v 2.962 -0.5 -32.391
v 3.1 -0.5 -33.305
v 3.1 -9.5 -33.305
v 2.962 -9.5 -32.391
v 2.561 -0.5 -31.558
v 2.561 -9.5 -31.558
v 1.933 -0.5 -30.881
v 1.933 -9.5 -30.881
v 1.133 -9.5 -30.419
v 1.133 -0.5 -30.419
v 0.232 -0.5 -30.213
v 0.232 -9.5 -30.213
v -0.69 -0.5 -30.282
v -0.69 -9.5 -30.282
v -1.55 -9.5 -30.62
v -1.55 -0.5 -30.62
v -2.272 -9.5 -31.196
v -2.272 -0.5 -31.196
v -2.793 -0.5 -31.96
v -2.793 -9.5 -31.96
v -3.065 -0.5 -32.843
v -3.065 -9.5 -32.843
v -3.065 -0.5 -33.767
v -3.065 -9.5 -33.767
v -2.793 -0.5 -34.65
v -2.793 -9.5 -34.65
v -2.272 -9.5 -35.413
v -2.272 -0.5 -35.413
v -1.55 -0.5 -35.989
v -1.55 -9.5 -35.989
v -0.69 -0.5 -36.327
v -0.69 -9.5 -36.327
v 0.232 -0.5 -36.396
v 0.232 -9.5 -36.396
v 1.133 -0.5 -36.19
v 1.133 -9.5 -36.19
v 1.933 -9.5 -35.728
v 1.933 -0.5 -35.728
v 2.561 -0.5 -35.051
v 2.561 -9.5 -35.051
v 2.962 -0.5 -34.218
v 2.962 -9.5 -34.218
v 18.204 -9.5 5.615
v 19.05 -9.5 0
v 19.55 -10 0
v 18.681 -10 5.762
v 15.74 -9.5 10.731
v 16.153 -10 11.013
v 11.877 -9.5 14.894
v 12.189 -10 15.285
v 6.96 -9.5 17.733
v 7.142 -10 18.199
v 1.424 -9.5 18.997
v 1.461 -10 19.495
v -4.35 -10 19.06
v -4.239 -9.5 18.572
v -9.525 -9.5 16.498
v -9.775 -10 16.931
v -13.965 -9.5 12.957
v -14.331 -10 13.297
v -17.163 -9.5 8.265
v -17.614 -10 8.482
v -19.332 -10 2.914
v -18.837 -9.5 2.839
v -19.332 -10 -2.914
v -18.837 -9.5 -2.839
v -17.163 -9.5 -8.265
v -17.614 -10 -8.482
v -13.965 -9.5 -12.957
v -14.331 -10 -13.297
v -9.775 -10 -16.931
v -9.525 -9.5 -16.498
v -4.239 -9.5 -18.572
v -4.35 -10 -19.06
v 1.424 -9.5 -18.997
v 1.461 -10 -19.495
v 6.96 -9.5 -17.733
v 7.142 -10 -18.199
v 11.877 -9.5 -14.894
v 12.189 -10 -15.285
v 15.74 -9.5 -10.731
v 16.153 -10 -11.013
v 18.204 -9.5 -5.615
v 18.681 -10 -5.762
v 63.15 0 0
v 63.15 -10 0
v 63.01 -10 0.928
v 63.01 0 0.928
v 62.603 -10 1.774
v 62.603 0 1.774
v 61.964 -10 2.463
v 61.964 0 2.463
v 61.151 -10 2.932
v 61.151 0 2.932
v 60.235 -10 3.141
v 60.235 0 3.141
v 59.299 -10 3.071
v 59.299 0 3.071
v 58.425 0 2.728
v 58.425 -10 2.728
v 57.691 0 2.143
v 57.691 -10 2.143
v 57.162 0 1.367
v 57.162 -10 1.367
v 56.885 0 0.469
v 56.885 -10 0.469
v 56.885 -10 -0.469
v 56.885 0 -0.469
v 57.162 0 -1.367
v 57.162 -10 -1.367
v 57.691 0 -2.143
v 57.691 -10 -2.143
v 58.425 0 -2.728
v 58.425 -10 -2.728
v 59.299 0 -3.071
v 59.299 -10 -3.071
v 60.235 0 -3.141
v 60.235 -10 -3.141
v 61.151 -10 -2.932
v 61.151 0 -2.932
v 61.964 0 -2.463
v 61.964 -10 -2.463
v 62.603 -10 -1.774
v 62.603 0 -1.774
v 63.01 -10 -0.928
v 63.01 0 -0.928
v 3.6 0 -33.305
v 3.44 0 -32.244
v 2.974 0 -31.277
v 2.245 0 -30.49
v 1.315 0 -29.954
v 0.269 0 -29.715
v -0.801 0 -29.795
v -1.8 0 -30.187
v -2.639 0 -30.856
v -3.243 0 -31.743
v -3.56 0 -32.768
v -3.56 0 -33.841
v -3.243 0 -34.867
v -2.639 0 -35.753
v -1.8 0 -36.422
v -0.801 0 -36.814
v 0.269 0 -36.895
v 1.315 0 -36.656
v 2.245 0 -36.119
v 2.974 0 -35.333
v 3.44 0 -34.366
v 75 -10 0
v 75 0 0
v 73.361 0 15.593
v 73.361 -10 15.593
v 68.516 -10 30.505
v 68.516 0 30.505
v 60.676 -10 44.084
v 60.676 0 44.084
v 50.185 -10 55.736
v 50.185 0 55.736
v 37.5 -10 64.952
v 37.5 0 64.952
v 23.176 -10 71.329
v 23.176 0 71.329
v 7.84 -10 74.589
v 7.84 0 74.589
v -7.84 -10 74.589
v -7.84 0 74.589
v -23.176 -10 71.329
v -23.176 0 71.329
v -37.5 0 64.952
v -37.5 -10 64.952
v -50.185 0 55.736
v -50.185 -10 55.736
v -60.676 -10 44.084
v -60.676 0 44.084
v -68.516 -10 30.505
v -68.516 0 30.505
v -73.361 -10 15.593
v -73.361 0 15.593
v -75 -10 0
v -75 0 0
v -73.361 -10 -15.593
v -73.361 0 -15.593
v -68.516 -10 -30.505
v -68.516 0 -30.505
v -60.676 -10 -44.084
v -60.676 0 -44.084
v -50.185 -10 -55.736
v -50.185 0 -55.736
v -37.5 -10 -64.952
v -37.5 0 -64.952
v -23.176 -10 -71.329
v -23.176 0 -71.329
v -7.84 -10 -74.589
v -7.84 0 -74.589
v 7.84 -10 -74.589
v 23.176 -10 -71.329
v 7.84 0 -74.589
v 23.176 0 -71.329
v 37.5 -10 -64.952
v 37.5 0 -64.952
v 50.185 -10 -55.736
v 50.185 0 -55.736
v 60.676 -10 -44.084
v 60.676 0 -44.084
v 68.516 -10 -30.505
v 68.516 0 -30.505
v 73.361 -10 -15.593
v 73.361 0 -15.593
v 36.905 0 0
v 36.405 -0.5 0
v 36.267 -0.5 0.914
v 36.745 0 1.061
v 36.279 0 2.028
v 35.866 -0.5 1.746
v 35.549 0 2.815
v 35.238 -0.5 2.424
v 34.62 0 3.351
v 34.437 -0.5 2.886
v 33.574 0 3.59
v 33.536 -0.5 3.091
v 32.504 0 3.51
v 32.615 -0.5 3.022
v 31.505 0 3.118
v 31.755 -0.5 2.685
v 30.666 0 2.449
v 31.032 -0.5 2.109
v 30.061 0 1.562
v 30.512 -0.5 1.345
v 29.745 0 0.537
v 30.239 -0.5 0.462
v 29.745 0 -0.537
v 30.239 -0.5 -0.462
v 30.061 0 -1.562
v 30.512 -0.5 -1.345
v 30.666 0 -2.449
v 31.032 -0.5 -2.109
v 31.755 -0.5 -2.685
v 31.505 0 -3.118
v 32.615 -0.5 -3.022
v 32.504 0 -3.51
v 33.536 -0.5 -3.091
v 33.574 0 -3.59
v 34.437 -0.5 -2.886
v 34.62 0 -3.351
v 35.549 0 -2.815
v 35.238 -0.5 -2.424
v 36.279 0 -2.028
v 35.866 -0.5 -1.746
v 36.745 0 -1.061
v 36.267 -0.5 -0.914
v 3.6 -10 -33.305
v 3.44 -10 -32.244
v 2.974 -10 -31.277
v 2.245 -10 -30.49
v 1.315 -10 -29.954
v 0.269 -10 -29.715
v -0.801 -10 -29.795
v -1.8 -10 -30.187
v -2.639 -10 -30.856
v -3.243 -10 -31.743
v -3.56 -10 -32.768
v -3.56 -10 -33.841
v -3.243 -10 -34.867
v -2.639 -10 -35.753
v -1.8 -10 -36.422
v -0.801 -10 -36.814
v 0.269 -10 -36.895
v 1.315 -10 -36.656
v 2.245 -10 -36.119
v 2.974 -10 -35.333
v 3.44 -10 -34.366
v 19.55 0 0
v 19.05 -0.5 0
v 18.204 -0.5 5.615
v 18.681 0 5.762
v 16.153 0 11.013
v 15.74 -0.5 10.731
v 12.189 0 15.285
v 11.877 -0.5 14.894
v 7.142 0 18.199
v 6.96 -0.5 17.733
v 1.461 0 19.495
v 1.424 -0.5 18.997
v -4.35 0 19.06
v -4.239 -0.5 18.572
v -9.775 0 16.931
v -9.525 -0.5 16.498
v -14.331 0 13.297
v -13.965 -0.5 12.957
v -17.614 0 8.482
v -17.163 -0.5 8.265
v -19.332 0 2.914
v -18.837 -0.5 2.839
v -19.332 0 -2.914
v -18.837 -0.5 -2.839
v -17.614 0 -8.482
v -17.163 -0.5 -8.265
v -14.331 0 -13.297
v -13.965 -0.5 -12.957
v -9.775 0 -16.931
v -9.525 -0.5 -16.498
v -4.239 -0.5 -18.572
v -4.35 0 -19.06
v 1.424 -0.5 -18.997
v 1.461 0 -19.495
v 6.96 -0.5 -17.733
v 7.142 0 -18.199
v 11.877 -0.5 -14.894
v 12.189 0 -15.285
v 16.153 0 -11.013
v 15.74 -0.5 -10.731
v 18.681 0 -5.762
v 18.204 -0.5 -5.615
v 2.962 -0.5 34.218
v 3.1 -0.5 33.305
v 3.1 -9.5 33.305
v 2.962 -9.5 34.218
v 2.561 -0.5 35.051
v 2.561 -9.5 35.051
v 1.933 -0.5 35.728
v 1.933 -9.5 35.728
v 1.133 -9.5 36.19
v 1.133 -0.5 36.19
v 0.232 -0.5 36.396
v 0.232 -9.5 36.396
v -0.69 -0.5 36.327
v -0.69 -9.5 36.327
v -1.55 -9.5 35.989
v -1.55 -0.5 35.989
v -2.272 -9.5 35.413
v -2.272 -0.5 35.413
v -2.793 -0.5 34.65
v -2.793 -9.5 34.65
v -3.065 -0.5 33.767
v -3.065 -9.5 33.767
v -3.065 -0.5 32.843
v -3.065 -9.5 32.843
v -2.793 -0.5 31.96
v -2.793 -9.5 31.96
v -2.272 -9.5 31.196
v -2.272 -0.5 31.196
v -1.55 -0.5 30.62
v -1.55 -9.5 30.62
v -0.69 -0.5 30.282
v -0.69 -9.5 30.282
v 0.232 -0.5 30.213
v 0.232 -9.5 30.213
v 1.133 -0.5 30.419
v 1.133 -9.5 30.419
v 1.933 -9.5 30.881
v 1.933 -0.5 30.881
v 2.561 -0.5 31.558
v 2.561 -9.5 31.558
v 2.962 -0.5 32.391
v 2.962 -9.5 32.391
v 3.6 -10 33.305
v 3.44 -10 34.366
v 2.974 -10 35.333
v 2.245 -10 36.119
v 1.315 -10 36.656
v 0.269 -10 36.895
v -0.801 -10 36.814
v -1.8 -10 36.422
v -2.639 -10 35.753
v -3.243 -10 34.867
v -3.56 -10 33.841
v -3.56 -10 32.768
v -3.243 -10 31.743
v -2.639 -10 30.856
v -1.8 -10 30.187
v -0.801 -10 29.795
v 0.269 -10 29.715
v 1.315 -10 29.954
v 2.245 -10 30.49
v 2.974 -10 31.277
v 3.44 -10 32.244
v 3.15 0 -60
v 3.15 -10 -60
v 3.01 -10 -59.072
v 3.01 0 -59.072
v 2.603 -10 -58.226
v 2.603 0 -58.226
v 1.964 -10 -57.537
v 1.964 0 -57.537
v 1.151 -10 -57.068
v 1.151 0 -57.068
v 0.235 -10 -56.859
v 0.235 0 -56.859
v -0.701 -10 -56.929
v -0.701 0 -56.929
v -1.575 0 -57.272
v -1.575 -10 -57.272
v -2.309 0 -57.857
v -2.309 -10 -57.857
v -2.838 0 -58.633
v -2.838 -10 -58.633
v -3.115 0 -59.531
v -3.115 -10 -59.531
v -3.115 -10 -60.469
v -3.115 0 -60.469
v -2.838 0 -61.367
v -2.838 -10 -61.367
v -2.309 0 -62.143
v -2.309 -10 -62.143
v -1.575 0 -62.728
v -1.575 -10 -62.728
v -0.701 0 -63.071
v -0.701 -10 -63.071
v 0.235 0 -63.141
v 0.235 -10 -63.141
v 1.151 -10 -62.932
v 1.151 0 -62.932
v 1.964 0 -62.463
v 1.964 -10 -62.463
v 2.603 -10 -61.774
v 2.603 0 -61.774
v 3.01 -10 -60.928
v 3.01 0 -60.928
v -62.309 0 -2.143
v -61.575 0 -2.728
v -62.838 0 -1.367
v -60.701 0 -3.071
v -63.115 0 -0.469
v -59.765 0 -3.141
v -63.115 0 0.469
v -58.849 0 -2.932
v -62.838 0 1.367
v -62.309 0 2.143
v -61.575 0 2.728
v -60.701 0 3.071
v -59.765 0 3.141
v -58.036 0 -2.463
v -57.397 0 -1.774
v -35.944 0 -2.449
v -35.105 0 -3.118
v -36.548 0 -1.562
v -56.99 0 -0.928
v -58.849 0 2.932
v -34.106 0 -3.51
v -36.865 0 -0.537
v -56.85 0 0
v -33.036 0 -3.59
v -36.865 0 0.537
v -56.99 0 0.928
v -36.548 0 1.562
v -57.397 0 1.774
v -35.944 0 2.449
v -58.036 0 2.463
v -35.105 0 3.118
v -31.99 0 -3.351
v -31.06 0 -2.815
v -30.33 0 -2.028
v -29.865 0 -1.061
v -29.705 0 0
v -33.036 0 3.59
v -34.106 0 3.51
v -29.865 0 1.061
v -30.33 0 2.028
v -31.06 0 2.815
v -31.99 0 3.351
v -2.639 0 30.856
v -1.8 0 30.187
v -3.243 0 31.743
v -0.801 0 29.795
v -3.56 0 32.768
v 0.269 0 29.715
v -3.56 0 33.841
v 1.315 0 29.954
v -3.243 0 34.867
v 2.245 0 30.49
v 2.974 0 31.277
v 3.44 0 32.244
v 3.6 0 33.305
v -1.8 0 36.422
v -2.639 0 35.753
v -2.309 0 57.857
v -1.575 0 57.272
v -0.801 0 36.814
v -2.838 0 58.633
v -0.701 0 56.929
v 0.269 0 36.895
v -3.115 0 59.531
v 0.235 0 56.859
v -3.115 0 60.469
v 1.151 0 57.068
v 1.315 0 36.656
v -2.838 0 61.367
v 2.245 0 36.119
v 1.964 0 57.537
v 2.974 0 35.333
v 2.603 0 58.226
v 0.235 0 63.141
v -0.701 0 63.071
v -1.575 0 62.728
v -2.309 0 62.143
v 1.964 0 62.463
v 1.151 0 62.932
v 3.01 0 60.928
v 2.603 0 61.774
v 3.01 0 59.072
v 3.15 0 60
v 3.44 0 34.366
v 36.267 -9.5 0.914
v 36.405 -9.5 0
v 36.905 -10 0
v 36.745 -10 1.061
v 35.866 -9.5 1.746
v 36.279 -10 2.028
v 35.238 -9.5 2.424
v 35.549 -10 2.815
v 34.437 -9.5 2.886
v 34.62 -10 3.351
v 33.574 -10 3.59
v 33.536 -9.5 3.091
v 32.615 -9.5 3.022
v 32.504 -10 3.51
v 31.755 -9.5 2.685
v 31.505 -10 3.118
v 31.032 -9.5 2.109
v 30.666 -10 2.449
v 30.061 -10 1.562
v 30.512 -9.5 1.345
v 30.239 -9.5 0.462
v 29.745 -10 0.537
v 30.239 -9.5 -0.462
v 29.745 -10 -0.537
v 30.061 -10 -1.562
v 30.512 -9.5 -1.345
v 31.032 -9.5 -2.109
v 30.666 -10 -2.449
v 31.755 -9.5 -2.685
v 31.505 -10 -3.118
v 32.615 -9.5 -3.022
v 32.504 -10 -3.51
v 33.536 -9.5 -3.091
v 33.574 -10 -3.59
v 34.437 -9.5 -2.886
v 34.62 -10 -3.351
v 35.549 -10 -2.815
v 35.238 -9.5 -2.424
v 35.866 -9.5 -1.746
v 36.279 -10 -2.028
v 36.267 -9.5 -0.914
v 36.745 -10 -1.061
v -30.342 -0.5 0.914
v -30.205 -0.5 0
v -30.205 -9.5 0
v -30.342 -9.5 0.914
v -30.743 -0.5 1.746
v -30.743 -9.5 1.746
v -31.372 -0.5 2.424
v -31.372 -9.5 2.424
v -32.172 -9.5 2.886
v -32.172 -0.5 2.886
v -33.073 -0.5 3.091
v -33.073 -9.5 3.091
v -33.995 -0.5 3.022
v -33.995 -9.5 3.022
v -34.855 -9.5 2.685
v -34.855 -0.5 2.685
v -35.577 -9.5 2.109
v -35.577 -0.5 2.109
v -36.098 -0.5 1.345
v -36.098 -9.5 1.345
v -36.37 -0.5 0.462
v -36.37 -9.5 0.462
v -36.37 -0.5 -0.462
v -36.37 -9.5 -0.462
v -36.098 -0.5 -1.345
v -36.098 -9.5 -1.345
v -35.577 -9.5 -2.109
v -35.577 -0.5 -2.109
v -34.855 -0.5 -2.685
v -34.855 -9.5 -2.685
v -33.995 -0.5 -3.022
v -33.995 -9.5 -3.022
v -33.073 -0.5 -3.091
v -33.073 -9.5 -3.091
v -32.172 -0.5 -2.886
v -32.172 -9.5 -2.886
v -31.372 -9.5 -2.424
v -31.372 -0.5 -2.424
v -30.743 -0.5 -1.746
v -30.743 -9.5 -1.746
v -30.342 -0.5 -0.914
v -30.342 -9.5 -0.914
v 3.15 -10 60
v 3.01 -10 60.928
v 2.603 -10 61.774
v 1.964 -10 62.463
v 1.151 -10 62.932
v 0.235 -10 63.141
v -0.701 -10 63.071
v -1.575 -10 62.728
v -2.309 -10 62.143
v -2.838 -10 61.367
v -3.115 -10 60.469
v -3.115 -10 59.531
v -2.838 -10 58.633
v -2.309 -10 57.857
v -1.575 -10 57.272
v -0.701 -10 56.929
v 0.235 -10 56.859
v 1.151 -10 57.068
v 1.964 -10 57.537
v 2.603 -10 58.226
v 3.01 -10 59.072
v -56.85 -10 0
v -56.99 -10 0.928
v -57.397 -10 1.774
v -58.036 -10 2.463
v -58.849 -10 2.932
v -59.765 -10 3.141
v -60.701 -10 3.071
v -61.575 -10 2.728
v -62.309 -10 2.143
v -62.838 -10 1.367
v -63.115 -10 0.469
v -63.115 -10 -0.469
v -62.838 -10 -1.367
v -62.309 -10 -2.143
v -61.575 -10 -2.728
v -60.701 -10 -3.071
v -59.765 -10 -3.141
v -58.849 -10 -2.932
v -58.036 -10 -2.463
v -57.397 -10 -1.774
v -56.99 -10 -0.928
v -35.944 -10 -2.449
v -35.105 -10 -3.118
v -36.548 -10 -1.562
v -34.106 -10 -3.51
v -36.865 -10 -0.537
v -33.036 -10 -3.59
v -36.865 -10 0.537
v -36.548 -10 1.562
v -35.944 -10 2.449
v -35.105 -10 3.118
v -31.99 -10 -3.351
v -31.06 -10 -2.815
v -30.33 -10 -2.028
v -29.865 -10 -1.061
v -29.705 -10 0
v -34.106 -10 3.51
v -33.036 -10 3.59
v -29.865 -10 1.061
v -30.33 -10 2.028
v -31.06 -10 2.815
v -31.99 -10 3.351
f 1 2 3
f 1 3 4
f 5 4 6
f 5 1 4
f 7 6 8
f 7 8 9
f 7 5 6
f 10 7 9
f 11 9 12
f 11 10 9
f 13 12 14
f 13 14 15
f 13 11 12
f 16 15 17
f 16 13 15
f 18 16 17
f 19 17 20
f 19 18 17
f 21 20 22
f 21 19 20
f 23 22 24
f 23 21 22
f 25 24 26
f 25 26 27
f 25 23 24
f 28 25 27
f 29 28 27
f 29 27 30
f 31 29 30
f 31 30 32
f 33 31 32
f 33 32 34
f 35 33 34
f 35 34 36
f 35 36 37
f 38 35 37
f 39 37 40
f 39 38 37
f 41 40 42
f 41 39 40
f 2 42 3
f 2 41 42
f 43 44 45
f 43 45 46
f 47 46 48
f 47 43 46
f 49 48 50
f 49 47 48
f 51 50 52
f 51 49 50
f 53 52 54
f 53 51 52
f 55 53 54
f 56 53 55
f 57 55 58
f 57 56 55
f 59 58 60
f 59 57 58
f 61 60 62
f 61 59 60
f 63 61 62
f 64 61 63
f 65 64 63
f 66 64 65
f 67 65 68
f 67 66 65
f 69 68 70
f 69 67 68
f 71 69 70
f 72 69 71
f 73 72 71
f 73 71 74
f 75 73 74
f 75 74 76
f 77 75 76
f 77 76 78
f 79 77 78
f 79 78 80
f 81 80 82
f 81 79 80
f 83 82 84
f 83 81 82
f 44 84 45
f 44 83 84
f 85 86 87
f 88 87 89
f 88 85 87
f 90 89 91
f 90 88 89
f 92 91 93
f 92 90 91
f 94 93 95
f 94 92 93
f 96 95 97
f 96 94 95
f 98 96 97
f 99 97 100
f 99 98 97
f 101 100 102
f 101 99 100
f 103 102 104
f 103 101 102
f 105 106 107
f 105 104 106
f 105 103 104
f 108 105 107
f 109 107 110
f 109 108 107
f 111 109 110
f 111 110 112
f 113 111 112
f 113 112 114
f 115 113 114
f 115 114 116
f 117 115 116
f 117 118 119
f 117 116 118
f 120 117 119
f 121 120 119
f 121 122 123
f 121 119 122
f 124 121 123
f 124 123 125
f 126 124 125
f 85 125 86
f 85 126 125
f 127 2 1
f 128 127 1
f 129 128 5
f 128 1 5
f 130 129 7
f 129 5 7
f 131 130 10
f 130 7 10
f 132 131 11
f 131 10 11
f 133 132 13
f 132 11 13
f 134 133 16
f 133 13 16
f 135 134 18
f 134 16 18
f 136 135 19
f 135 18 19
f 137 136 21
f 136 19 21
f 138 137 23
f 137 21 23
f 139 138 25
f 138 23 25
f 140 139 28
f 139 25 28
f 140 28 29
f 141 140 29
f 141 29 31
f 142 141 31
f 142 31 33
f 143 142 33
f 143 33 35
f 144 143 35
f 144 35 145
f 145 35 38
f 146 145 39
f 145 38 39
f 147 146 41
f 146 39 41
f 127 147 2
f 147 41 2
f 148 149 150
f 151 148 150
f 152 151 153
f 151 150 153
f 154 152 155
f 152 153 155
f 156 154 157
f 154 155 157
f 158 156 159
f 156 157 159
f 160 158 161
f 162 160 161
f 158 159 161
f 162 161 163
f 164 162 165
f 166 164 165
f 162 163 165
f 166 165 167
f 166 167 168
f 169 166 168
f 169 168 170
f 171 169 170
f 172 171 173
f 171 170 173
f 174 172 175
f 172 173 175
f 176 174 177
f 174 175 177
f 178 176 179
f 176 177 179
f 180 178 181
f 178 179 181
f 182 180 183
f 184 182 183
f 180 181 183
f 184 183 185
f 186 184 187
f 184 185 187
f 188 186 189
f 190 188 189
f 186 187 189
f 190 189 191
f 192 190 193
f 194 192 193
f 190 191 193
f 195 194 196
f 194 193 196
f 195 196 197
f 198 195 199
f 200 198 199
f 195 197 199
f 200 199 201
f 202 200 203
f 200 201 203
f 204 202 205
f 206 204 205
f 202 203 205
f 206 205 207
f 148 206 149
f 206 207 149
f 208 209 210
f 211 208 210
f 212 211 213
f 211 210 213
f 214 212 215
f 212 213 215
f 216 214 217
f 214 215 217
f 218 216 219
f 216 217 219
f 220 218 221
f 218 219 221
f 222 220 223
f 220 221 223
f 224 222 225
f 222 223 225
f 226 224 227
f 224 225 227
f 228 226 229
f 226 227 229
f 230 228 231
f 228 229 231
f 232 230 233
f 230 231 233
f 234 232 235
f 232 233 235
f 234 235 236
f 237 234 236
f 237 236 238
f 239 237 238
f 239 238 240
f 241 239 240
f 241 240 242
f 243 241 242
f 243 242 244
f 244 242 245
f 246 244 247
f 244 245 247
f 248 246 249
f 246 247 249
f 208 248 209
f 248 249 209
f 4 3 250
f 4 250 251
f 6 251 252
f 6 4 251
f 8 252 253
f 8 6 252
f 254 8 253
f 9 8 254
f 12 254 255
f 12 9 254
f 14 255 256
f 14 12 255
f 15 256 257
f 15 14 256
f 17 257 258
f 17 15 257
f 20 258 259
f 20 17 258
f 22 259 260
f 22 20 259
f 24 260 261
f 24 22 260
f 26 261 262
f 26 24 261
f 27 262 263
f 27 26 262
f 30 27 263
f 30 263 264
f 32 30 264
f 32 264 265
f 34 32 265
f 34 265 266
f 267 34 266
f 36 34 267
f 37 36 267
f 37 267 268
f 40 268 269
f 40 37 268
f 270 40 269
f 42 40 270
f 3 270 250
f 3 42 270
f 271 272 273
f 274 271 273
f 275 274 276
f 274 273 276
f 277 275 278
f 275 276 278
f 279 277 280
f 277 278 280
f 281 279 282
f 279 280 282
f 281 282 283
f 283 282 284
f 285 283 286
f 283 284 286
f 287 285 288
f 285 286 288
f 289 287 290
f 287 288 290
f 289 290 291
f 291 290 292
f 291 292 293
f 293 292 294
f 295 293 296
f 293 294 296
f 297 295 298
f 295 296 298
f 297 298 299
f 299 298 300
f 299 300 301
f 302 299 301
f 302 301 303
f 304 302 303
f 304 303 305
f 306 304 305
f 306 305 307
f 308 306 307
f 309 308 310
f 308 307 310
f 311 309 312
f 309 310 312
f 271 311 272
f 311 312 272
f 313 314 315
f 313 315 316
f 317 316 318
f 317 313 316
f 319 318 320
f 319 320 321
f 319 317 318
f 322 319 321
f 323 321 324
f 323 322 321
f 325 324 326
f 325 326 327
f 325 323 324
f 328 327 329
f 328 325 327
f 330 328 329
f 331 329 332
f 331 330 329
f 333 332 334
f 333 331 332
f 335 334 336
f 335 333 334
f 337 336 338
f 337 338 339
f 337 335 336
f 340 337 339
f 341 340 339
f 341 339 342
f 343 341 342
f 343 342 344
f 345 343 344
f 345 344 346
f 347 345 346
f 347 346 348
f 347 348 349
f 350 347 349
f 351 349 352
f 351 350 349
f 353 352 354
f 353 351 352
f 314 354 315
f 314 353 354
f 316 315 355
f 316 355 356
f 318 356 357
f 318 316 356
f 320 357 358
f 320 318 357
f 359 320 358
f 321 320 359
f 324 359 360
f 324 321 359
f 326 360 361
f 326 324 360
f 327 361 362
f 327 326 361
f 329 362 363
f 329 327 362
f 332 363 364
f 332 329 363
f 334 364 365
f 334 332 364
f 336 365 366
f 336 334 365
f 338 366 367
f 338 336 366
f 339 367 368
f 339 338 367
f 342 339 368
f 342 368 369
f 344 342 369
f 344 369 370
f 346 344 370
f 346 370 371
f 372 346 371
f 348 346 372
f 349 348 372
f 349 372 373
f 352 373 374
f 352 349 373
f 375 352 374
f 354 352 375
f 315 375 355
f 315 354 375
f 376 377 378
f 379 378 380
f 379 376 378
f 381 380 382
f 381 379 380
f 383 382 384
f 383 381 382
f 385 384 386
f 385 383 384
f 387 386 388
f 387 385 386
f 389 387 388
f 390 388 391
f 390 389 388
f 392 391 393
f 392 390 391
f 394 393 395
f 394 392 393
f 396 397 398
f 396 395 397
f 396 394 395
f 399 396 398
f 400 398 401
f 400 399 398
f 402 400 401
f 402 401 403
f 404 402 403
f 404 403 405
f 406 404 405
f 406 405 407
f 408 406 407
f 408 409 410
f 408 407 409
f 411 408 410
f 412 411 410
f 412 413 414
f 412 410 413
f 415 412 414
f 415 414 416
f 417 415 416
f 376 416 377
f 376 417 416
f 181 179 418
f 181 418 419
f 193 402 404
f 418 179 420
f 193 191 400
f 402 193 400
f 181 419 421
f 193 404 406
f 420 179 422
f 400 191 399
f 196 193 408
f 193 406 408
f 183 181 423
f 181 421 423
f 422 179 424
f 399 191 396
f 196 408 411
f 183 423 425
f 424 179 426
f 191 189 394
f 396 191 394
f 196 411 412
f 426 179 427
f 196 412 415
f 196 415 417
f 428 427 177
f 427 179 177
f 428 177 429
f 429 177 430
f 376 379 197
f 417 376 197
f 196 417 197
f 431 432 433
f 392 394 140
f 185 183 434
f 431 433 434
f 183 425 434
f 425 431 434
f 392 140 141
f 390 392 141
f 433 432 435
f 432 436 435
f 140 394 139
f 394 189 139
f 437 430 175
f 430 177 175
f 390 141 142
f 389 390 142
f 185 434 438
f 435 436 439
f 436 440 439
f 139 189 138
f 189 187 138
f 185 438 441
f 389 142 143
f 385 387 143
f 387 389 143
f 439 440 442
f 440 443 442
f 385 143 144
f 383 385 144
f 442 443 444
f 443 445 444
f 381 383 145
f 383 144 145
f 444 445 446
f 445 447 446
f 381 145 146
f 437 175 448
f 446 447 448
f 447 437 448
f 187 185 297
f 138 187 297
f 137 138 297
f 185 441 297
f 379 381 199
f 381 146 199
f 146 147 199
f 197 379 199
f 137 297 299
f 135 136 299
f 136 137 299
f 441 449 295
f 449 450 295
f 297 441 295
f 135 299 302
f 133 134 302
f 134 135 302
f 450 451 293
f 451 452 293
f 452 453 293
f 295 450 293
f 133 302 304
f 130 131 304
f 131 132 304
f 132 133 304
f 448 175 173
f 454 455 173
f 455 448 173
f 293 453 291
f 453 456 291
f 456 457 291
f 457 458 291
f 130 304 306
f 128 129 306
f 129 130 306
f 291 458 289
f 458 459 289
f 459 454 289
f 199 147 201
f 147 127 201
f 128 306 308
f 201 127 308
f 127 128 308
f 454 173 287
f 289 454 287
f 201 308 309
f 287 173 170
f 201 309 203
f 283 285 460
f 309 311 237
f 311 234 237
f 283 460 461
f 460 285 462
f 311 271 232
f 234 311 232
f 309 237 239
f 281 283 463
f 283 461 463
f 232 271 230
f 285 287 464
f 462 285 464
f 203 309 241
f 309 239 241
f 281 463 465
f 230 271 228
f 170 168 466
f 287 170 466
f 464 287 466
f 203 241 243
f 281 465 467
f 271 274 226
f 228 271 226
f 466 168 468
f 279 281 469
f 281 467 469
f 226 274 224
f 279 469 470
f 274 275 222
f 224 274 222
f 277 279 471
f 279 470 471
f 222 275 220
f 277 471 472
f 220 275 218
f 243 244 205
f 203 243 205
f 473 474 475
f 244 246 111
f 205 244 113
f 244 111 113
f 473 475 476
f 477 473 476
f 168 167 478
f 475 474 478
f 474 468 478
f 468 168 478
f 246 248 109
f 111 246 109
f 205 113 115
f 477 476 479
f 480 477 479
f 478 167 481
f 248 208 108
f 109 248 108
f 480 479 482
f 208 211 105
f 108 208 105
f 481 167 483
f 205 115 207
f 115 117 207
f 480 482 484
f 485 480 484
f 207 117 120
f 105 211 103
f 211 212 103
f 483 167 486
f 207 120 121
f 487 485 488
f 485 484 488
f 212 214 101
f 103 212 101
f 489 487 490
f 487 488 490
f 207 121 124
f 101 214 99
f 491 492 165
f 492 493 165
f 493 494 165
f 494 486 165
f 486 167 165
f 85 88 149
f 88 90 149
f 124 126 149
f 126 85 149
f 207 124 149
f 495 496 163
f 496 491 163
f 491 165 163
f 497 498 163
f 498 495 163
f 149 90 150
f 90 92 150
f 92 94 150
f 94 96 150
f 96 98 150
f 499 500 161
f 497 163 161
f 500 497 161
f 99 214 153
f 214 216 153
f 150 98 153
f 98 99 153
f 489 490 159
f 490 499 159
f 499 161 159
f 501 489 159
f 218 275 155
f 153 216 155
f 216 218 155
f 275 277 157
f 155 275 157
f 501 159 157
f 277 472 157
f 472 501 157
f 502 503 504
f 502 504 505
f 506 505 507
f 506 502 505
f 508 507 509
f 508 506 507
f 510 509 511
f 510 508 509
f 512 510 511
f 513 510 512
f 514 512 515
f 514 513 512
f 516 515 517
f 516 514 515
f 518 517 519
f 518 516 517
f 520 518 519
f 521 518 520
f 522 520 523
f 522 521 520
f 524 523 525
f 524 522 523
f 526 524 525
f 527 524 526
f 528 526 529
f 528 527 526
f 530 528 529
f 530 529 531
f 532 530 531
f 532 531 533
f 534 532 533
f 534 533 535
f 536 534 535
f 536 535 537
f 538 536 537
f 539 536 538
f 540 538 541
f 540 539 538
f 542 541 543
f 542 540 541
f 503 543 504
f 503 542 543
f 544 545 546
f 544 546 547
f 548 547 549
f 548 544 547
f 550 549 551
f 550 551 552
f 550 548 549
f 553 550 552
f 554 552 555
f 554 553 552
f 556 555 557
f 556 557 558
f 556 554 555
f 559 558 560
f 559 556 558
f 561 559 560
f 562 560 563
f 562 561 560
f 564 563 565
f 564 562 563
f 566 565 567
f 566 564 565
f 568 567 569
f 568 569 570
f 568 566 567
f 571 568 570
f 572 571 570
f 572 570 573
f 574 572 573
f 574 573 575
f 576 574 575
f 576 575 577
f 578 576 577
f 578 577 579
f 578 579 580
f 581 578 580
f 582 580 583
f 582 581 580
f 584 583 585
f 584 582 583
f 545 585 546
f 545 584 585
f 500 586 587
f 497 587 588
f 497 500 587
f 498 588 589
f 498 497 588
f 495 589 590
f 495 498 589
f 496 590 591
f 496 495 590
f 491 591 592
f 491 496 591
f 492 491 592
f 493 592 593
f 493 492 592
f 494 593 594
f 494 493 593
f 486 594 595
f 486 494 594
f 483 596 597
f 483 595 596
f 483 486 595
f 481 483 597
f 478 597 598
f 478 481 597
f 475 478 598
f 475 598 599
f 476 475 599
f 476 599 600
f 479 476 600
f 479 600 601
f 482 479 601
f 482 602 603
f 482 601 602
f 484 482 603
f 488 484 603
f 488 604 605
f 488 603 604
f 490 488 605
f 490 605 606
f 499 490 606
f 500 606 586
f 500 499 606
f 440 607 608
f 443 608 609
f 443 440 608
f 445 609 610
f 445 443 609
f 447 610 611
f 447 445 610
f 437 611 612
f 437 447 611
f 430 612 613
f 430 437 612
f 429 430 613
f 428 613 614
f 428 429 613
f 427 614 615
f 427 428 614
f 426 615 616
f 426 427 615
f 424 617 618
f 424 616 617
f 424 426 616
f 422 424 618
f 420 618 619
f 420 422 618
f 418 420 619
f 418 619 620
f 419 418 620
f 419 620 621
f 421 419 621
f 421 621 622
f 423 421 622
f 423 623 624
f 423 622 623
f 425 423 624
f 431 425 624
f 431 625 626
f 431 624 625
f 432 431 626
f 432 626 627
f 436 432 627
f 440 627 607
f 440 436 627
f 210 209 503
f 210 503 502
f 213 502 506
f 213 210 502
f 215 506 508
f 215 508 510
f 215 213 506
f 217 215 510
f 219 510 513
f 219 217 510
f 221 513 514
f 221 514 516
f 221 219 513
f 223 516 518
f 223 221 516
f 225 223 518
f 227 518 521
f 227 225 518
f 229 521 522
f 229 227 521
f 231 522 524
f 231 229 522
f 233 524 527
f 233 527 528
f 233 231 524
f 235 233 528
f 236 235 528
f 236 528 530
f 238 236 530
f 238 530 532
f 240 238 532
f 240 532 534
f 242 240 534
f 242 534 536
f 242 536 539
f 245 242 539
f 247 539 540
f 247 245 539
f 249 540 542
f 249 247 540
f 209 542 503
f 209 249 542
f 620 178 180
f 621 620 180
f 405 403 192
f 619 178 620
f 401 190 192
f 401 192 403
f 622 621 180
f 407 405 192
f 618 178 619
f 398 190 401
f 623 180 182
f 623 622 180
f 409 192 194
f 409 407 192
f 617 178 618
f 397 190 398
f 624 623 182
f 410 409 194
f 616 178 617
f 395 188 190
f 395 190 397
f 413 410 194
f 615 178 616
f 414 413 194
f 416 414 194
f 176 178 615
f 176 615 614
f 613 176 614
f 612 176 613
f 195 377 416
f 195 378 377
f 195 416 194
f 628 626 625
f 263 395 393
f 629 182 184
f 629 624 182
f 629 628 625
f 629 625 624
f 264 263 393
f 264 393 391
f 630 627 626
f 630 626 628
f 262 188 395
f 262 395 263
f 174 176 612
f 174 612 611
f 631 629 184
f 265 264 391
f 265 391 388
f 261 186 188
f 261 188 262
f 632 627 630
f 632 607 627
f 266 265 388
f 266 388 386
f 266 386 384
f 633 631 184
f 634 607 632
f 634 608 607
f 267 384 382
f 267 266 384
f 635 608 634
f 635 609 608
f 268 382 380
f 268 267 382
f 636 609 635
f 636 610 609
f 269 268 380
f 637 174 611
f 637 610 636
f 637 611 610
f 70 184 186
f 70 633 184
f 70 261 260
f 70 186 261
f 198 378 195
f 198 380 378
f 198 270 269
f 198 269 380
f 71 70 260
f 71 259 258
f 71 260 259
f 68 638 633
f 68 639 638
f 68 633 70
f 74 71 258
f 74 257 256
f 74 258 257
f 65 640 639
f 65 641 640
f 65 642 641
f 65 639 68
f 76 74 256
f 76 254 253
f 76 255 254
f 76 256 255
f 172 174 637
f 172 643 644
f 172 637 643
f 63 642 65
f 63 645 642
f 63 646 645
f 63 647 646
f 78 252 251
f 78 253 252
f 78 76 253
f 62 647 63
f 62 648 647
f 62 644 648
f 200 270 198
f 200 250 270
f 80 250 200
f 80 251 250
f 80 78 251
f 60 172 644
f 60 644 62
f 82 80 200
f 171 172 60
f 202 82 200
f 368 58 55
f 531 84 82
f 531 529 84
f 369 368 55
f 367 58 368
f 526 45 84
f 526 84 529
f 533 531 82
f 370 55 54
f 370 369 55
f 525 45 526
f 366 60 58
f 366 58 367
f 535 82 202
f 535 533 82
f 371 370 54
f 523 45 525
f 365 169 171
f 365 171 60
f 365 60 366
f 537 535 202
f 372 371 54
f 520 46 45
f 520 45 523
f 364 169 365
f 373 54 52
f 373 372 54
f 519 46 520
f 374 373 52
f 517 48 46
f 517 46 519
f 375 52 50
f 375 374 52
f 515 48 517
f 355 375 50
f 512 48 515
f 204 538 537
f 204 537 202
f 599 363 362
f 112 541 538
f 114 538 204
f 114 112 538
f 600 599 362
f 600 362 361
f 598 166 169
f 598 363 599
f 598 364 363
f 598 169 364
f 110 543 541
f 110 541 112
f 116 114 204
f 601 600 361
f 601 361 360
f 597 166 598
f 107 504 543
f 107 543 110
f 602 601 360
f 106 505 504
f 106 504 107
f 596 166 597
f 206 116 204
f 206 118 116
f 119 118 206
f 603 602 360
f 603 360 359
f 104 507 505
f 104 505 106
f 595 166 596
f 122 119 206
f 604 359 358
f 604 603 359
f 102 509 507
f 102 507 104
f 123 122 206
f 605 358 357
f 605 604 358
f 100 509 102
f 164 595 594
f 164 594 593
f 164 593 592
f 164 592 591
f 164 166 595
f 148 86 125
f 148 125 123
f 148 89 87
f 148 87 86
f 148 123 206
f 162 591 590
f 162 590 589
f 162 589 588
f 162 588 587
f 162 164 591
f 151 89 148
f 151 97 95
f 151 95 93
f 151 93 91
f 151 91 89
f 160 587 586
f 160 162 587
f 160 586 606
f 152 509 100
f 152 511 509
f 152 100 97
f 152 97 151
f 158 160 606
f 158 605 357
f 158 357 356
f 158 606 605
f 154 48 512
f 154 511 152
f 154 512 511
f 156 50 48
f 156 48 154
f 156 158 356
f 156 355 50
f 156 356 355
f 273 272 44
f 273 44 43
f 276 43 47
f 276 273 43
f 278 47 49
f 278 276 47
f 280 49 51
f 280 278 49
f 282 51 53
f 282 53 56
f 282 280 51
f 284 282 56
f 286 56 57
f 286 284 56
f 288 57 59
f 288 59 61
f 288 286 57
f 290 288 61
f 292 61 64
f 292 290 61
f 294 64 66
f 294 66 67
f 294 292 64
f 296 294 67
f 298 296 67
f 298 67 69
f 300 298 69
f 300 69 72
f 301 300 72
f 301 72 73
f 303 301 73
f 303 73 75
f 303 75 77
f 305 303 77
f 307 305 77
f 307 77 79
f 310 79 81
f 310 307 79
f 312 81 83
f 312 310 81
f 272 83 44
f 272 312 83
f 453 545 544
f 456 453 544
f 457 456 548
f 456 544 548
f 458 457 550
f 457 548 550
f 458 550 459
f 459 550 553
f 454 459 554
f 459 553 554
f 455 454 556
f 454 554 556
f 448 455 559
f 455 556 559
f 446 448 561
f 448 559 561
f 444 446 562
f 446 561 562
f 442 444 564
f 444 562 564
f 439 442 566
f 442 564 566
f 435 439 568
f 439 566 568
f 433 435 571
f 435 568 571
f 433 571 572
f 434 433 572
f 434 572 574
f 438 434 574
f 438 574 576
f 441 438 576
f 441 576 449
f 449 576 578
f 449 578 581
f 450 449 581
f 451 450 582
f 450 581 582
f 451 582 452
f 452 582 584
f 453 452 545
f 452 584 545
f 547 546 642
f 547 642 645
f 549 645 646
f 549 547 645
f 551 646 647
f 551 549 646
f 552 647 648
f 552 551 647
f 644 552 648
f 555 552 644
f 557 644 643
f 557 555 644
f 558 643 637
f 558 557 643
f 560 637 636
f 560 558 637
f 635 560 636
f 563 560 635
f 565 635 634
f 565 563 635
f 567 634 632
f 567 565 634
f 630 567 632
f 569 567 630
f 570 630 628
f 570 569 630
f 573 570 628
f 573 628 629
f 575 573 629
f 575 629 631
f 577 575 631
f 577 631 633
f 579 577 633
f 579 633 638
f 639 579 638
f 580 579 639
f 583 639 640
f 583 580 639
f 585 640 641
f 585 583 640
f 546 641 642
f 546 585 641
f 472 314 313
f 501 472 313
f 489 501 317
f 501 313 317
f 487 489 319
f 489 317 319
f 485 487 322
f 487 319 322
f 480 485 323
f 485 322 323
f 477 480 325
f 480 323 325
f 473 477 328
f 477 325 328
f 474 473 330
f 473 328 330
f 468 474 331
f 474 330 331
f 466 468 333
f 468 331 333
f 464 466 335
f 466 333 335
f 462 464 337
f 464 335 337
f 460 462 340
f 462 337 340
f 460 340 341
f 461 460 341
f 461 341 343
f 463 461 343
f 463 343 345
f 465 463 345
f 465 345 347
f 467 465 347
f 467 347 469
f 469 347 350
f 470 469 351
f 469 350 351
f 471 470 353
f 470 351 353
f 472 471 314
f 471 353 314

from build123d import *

# Parameters (mm, degrees)
F0_R     = 75
F0_R_2   = 19.05
F1_DEPTH = 10
F2_R     = 3.1
F3_DEPTH = 10
F4_SIZE  = 0.5
F5_R     = 3.15
F6_DEPTH = 25


with BuildPart() as f1:
    # F0 (on Front) → F1 (new body)
    with BuildSketch(Plane.XZ):
        Circle(F0_R)
        Circle(F0_R_2, mode=Mode.SUBTRACT)
    extrude(amount=F1_DEPTH)

    # F2 (on face) → F3 (cut, through all)
    with BuildSketch(Plane.XZ):
        with Locations((0, 33.3047293939)):
            Circle(F2_R)
        with Locations((33.3047293939, 0)):
            Circle(F2_R)
        with Locations((0, -33.3047293939)):
            Circle(F2_R)
        with Locations((-33.3047293939, 0)):
            Circle(F2_R)
    extrude(amount=F3_DEPTH, mode=Mode.SUBTRACT)

    # F4
    f4_edges = [f1.edges().sort_by_distance(p)[0] for p in [
        (-36.404729, -10, 0),
        (-3.1, -10, 33.304729),
        (30.204729, -10, 0),
        (-3.1, -10, -33.304729),
        (-3.1, 0, -33.304729),
        (-36.404729, 0, 0),
        (-3.1, 0, 33.304729),
        (30.204729, 0, 0),
        (-19.05, 0, 0),
        (-19.05, -10, 0),
    ]]
    chamfer(f4_edges, length=F4_SIZE)

    # F5 (on face) → F6 (cut)
    with BuildSketch(Plane.XZ):
        with Locations((60, 0)):
            Circle(F5_R)
        with Locations((0, 60)):
            Circle(F5_R)
        with Locations((-60, 0)):
            Circle(F5_R)
        with Locations((0, -60)):
            Circle(F5_R)
    extrude(amount=F6_DEPTH, mode=Mode.SUBTRACT)


solid = f1.part
